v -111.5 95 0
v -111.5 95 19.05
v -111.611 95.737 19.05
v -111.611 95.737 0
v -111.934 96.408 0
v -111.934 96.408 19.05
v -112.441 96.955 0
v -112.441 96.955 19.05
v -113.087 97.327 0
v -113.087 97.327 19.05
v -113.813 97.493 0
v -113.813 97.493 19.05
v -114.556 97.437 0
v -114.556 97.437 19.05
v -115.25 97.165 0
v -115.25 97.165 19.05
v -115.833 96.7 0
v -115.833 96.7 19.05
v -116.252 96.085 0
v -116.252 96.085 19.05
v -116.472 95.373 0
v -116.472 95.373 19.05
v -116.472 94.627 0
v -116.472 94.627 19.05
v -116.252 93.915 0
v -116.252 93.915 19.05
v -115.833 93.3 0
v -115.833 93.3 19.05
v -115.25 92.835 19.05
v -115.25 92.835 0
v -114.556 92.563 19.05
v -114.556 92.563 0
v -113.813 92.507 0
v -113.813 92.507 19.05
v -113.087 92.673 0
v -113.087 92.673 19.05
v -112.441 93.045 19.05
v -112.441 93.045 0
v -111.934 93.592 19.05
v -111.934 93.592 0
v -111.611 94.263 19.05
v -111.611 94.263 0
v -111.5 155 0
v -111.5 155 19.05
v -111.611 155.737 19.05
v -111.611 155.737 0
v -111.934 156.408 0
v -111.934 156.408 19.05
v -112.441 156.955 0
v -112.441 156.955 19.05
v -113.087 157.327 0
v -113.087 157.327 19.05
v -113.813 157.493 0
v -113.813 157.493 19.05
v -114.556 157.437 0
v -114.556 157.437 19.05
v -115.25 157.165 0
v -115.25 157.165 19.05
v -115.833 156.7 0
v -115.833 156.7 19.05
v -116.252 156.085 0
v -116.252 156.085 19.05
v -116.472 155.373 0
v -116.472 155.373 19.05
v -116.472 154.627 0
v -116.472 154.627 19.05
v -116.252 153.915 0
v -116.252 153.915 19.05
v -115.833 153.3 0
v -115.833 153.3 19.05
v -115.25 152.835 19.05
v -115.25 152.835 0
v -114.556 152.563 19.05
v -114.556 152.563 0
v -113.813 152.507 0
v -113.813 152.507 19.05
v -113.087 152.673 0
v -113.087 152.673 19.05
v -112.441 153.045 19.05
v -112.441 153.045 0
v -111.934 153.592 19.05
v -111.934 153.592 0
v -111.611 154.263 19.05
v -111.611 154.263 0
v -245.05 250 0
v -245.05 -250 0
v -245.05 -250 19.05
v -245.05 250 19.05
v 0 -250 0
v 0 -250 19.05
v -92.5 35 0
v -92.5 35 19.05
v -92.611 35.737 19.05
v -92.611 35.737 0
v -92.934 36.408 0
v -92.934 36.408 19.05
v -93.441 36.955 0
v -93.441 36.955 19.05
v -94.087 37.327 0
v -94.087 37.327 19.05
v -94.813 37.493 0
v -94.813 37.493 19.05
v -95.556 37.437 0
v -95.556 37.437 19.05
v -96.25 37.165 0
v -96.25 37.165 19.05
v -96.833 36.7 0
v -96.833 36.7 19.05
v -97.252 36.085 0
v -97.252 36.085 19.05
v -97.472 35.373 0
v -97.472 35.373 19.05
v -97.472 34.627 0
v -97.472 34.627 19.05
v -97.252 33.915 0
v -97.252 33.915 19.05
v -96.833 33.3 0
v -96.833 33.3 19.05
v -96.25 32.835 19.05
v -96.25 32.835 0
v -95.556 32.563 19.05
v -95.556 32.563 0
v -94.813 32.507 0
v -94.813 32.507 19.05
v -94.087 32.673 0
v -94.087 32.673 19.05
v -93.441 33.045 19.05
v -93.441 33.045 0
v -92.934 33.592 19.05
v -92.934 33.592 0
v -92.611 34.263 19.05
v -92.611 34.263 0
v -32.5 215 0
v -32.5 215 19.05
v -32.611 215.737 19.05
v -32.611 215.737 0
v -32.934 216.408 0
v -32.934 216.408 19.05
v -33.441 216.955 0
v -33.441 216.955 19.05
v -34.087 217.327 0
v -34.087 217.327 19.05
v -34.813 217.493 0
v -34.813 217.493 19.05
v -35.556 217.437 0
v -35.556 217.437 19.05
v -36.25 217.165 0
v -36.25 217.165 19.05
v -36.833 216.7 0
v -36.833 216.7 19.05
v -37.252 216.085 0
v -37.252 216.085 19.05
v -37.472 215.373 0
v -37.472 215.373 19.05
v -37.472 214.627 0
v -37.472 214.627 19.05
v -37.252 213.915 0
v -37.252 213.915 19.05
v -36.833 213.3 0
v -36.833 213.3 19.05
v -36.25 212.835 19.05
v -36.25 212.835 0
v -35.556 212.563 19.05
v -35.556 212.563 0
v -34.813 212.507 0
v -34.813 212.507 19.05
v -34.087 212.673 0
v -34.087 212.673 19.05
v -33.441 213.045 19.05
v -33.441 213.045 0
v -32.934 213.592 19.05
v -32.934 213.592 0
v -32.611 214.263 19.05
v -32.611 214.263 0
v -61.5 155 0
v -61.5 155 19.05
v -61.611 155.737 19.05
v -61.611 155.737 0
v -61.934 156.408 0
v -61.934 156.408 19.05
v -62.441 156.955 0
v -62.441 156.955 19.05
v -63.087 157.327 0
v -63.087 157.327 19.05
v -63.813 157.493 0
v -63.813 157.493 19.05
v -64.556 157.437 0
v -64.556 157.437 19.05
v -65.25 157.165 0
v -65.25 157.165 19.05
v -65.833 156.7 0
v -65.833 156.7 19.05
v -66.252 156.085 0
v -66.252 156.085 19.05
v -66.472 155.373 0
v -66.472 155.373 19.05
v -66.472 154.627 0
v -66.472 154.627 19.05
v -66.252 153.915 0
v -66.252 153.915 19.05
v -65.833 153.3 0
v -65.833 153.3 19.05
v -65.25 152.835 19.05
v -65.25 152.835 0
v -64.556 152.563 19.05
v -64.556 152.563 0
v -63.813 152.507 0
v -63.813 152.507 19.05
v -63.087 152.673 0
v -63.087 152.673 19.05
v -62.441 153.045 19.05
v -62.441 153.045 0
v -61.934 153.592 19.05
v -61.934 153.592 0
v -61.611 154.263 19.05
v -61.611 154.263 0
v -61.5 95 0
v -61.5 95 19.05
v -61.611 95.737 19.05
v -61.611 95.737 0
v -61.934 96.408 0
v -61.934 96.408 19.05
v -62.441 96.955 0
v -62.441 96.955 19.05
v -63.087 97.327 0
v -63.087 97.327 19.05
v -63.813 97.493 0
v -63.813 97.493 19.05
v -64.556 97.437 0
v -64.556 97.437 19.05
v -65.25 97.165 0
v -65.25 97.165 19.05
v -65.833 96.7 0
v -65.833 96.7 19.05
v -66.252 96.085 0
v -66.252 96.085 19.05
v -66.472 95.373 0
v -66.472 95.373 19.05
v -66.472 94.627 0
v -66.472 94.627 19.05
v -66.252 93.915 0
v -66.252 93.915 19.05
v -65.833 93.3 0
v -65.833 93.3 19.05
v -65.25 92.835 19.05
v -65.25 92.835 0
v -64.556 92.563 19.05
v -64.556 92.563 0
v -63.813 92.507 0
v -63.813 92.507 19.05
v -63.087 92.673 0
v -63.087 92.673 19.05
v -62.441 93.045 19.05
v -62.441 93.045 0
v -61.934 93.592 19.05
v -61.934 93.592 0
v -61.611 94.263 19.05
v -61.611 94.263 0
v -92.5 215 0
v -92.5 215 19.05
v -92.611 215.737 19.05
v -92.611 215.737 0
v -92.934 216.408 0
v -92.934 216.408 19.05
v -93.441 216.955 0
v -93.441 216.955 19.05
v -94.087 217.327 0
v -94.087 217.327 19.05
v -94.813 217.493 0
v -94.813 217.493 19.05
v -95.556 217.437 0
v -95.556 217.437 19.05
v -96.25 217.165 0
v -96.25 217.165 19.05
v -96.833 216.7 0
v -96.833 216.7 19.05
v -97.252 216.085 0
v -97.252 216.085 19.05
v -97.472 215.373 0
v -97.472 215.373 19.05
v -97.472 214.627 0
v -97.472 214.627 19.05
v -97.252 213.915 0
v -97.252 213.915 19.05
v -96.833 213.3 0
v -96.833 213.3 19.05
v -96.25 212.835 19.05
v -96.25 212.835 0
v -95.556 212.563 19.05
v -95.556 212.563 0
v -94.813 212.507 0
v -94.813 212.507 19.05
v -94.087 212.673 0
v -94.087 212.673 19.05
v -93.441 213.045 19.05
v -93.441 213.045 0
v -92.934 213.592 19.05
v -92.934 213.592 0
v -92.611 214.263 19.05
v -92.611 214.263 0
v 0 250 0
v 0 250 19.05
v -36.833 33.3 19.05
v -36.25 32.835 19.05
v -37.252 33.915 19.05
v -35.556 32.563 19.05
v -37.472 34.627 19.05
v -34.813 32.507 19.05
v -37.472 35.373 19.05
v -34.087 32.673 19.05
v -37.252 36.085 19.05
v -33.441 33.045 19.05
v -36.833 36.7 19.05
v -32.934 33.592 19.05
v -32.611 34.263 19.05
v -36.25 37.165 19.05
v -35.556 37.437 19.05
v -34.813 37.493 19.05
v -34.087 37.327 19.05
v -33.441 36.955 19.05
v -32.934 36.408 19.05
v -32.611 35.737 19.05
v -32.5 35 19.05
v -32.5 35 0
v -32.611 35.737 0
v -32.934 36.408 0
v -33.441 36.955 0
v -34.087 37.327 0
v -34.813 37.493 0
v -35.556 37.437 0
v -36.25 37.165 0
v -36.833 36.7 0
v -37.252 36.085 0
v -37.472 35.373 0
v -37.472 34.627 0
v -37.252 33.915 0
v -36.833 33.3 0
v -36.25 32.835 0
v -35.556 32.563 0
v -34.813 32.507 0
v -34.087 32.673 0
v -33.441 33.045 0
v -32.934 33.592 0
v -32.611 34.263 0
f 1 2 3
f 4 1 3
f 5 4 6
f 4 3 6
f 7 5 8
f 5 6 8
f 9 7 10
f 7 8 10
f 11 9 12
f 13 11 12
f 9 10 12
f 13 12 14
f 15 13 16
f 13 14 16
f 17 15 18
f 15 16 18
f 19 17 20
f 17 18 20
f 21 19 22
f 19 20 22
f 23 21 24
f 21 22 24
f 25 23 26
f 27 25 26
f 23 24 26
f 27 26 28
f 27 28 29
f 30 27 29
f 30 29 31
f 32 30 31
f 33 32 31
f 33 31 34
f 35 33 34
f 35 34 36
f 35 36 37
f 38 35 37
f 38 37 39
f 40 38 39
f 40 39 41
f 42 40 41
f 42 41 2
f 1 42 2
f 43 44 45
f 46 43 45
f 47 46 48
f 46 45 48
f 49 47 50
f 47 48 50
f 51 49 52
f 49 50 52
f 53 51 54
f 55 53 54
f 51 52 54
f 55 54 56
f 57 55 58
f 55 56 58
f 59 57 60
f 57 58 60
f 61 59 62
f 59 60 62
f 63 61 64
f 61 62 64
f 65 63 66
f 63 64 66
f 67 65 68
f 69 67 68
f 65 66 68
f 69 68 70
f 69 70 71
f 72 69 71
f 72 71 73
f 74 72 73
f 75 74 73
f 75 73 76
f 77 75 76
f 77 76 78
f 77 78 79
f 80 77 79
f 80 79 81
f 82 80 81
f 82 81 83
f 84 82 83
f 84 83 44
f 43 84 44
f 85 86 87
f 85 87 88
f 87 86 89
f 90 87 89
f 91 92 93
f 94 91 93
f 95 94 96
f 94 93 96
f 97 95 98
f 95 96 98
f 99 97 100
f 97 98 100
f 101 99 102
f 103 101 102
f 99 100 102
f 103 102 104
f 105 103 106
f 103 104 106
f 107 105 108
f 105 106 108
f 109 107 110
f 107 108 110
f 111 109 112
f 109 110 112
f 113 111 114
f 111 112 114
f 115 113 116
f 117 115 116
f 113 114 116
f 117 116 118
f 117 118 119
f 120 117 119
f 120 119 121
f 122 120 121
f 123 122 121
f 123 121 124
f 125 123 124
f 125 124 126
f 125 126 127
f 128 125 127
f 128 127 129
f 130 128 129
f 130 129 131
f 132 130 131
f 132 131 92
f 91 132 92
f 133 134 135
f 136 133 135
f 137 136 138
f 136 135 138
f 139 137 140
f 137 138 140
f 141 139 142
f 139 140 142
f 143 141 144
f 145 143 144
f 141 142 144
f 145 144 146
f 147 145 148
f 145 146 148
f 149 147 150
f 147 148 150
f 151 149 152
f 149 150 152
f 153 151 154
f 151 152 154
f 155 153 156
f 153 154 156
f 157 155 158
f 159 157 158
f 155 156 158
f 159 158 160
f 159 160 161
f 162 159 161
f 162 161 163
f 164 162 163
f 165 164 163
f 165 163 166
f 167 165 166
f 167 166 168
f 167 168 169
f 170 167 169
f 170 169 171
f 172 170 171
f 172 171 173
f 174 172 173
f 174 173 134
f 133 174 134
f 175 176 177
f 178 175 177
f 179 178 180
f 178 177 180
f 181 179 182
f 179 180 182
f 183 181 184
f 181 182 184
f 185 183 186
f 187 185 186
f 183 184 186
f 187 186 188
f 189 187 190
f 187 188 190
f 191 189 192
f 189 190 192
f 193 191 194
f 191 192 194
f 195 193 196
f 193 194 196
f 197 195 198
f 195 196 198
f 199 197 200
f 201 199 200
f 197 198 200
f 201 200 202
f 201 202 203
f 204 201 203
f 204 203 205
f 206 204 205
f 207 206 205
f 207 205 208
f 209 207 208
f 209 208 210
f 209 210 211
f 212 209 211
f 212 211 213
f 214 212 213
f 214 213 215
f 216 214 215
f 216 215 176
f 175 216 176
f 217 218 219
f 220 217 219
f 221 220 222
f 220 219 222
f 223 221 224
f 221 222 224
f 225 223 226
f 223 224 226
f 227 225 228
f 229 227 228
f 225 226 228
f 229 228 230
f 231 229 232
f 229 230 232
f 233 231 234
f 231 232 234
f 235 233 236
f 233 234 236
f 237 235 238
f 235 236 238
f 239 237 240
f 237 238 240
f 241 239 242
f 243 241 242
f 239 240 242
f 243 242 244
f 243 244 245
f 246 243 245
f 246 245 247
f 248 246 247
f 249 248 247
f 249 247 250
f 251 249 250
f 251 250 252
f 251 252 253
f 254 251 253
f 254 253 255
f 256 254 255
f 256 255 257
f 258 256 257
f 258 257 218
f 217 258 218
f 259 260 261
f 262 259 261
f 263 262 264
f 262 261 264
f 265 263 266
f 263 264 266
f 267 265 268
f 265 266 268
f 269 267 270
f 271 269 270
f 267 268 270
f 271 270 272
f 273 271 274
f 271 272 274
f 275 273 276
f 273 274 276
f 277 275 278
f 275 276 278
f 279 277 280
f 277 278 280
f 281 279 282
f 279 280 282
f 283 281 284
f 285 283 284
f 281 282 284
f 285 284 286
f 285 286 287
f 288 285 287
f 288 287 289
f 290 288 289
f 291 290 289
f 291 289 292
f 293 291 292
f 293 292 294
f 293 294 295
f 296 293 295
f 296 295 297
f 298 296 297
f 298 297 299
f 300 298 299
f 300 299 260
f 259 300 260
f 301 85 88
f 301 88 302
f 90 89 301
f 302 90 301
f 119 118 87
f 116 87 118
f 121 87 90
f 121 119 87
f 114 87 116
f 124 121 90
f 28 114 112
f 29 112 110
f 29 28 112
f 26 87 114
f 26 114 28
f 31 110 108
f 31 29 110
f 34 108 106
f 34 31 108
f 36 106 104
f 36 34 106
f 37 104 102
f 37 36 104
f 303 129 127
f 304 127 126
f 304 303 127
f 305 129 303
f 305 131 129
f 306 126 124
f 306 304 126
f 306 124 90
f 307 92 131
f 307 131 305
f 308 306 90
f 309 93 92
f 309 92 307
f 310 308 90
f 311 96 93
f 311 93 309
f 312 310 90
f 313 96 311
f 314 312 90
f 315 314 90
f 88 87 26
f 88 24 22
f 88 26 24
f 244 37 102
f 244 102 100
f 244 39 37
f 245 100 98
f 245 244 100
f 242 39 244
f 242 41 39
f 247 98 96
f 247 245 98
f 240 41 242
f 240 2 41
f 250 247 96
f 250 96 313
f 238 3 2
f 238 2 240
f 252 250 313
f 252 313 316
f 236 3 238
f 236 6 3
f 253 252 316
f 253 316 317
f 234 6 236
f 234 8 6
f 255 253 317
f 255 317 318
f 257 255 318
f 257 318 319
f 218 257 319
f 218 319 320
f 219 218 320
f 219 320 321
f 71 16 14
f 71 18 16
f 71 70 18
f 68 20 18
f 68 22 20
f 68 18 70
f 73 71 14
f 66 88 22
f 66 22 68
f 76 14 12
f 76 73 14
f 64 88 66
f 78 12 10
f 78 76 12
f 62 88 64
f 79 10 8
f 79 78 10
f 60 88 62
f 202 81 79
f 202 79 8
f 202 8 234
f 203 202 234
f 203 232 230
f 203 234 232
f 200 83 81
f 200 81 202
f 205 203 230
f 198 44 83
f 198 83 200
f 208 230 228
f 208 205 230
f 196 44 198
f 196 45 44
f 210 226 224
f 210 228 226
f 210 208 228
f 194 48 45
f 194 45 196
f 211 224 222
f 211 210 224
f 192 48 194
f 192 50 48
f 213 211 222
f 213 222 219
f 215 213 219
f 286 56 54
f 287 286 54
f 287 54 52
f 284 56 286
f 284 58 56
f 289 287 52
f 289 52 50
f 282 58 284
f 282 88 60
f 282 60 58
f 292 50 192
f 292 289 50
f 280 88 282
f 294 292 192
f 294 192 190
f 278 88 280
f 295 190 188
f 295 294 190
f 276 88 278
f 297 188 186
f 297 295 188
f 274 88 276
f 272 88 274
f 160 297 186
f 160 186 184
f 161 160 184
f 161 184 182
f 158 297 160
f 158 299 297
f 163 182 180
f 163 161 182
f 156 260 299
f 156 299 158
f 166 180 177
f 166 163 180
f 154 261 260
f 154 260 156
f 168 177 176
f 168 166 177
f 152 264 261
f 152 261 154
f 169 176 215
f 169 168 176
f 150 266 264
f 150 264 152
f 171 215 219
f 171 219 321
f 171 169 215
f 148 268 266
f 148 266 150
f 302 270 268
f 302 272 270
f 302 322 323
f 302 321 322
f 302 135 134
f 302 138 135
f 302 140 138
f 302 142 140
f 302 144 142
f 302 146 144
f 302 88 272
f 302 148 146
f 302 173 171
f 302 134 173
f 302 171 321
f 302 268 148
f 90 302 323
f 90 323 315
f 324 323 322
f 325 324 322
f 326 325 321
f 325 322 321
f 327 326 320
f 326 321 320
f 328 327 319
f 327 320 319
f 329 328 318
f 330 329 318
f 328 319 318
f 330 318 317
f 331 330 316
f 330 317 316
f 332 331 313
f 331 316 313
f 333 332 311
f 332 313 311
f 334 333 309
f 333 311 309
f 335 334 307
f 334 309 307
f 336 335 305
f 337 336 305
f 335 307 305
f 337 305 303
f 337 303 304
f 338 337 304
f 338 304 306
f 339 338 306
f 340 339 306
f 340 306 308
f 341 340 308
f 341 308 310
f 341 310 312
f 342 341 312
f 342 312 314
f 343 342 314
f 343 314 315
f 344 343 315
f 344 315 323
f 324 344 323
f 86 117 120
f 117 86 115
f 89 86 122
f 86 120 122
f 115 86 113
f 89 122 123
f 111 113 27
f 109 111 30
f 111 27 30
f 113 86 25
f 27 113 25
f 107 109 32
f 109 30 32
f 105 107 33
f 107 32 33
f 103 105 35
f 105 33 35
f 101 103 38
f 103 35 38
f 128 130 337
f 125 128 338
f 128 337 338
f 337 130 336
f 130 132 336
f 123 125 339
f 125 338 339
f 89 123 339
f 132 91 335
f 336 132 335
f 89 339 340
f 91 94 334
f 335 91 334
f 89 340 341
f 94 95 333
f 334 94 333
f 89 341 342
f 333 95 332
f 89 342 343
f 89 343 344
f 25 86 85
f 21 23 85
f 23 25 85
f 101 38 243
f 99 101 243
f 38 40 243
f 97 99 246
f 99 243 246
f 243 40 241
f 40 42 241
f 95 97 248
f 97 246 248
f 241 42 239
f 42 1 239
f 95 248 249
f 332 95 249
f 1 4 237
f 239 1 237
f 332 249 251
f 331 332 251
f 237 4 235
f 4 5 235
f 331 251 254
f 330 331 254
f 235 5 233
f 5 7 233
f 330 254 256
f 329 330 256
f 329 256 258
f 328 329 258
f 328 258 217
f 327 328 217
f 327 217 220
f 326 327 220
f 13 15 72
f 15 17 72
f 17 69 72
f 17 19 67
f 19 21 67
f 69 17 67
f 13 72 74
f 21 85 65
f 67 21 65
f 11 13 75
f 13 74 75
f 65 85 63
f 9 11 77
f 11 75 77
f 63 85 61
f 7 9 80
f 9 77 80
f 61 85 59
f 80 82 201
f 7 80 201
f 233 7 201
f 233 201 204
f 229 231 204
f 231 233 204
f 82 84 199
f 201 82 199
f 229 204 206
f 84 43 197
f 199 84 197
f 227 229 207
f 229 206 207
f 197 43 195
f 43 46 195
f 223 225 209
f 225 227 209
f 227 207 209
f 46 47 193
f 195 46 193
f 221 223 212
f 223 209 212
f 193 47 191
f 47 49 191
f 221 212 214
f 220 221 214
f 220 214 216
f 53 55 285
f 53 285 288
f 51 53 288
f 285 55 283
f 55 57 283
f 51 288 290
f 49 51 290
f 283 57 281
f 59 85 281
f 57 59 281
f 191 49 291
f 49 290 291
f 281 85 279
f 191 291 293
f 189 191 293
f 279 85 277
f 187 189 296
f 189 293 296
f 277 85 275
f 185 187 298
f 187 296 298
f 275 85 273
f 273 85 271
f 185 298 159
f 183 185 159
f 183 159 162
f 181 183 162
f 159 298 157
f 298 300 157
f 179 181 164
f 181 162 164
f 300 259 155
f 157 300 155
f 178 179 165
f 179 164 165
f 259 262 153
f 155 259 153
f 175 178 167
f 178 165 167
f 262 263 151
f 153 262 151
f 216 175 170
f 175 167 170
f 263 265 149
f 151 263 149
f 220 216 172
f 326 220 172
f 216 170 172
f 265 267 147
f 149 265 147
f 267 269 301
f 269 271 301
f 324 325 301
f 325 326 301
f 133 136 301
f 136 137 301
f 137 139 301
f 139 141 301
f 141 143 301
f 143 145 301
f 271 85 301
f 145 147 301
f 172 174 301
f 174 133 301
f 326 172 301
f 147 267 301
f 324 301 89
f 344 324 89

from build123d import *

# Parameters (mm, degrees)
SKETCH1_W                 = 245.05
SKETCH1_H                 = 500
BOSS_EXTRUDE1_DEPTH       = 19.05
F_5_0MM_DOWEL_HOLE1_D     = 5
F_5_0MM_DOWEL_HOLE1_DEPTH = 28.497848452
F_5_0MM_DOWEL_HOLE1_TIP   = 1.502151548


with BuildPart() as part:
    # Sketch1 → Boss-Extrude1 (new body)
    with BuildSketch(Plane.XY):
        with Locations((-122.525, 0)):
            Rectangle(SKETCH1_W, SKETCH1_H)
    extrude(amount=BOSS_EXTRUDE1_DEPTH)

    # Ø5.0mm Dowel Hole1
    with Locations(Plane(origin=(0, 0, 0), x_dir=(-1, 0, 0), z_dir=(0, 0, -1))):
        with Locations((35, 35), (95, 35), (114, 95), (64, 95), (64, 155), (35, 215), (95, 215), (114, 155)):
            Hole(F_5_0MM_DOWEL_HOLE1_D / 2, depth=F_5_0MM_DOWEL_HOLE1_DEPTH)
            with Locations((0, 0, -(F_5_0MM_DOWEL_HOLE1_DEPTH + F_5_0MM_DOWEL_HOLE1_TIP / 2))):  # 118° drill point
                Cone(0, F_5_0MM_DOWEL_HOLE1_D / 2, F_5_0MM_DOWEL_HOLE1_TIP, mode=Mode.SUBTRACT)


solid = part.part
